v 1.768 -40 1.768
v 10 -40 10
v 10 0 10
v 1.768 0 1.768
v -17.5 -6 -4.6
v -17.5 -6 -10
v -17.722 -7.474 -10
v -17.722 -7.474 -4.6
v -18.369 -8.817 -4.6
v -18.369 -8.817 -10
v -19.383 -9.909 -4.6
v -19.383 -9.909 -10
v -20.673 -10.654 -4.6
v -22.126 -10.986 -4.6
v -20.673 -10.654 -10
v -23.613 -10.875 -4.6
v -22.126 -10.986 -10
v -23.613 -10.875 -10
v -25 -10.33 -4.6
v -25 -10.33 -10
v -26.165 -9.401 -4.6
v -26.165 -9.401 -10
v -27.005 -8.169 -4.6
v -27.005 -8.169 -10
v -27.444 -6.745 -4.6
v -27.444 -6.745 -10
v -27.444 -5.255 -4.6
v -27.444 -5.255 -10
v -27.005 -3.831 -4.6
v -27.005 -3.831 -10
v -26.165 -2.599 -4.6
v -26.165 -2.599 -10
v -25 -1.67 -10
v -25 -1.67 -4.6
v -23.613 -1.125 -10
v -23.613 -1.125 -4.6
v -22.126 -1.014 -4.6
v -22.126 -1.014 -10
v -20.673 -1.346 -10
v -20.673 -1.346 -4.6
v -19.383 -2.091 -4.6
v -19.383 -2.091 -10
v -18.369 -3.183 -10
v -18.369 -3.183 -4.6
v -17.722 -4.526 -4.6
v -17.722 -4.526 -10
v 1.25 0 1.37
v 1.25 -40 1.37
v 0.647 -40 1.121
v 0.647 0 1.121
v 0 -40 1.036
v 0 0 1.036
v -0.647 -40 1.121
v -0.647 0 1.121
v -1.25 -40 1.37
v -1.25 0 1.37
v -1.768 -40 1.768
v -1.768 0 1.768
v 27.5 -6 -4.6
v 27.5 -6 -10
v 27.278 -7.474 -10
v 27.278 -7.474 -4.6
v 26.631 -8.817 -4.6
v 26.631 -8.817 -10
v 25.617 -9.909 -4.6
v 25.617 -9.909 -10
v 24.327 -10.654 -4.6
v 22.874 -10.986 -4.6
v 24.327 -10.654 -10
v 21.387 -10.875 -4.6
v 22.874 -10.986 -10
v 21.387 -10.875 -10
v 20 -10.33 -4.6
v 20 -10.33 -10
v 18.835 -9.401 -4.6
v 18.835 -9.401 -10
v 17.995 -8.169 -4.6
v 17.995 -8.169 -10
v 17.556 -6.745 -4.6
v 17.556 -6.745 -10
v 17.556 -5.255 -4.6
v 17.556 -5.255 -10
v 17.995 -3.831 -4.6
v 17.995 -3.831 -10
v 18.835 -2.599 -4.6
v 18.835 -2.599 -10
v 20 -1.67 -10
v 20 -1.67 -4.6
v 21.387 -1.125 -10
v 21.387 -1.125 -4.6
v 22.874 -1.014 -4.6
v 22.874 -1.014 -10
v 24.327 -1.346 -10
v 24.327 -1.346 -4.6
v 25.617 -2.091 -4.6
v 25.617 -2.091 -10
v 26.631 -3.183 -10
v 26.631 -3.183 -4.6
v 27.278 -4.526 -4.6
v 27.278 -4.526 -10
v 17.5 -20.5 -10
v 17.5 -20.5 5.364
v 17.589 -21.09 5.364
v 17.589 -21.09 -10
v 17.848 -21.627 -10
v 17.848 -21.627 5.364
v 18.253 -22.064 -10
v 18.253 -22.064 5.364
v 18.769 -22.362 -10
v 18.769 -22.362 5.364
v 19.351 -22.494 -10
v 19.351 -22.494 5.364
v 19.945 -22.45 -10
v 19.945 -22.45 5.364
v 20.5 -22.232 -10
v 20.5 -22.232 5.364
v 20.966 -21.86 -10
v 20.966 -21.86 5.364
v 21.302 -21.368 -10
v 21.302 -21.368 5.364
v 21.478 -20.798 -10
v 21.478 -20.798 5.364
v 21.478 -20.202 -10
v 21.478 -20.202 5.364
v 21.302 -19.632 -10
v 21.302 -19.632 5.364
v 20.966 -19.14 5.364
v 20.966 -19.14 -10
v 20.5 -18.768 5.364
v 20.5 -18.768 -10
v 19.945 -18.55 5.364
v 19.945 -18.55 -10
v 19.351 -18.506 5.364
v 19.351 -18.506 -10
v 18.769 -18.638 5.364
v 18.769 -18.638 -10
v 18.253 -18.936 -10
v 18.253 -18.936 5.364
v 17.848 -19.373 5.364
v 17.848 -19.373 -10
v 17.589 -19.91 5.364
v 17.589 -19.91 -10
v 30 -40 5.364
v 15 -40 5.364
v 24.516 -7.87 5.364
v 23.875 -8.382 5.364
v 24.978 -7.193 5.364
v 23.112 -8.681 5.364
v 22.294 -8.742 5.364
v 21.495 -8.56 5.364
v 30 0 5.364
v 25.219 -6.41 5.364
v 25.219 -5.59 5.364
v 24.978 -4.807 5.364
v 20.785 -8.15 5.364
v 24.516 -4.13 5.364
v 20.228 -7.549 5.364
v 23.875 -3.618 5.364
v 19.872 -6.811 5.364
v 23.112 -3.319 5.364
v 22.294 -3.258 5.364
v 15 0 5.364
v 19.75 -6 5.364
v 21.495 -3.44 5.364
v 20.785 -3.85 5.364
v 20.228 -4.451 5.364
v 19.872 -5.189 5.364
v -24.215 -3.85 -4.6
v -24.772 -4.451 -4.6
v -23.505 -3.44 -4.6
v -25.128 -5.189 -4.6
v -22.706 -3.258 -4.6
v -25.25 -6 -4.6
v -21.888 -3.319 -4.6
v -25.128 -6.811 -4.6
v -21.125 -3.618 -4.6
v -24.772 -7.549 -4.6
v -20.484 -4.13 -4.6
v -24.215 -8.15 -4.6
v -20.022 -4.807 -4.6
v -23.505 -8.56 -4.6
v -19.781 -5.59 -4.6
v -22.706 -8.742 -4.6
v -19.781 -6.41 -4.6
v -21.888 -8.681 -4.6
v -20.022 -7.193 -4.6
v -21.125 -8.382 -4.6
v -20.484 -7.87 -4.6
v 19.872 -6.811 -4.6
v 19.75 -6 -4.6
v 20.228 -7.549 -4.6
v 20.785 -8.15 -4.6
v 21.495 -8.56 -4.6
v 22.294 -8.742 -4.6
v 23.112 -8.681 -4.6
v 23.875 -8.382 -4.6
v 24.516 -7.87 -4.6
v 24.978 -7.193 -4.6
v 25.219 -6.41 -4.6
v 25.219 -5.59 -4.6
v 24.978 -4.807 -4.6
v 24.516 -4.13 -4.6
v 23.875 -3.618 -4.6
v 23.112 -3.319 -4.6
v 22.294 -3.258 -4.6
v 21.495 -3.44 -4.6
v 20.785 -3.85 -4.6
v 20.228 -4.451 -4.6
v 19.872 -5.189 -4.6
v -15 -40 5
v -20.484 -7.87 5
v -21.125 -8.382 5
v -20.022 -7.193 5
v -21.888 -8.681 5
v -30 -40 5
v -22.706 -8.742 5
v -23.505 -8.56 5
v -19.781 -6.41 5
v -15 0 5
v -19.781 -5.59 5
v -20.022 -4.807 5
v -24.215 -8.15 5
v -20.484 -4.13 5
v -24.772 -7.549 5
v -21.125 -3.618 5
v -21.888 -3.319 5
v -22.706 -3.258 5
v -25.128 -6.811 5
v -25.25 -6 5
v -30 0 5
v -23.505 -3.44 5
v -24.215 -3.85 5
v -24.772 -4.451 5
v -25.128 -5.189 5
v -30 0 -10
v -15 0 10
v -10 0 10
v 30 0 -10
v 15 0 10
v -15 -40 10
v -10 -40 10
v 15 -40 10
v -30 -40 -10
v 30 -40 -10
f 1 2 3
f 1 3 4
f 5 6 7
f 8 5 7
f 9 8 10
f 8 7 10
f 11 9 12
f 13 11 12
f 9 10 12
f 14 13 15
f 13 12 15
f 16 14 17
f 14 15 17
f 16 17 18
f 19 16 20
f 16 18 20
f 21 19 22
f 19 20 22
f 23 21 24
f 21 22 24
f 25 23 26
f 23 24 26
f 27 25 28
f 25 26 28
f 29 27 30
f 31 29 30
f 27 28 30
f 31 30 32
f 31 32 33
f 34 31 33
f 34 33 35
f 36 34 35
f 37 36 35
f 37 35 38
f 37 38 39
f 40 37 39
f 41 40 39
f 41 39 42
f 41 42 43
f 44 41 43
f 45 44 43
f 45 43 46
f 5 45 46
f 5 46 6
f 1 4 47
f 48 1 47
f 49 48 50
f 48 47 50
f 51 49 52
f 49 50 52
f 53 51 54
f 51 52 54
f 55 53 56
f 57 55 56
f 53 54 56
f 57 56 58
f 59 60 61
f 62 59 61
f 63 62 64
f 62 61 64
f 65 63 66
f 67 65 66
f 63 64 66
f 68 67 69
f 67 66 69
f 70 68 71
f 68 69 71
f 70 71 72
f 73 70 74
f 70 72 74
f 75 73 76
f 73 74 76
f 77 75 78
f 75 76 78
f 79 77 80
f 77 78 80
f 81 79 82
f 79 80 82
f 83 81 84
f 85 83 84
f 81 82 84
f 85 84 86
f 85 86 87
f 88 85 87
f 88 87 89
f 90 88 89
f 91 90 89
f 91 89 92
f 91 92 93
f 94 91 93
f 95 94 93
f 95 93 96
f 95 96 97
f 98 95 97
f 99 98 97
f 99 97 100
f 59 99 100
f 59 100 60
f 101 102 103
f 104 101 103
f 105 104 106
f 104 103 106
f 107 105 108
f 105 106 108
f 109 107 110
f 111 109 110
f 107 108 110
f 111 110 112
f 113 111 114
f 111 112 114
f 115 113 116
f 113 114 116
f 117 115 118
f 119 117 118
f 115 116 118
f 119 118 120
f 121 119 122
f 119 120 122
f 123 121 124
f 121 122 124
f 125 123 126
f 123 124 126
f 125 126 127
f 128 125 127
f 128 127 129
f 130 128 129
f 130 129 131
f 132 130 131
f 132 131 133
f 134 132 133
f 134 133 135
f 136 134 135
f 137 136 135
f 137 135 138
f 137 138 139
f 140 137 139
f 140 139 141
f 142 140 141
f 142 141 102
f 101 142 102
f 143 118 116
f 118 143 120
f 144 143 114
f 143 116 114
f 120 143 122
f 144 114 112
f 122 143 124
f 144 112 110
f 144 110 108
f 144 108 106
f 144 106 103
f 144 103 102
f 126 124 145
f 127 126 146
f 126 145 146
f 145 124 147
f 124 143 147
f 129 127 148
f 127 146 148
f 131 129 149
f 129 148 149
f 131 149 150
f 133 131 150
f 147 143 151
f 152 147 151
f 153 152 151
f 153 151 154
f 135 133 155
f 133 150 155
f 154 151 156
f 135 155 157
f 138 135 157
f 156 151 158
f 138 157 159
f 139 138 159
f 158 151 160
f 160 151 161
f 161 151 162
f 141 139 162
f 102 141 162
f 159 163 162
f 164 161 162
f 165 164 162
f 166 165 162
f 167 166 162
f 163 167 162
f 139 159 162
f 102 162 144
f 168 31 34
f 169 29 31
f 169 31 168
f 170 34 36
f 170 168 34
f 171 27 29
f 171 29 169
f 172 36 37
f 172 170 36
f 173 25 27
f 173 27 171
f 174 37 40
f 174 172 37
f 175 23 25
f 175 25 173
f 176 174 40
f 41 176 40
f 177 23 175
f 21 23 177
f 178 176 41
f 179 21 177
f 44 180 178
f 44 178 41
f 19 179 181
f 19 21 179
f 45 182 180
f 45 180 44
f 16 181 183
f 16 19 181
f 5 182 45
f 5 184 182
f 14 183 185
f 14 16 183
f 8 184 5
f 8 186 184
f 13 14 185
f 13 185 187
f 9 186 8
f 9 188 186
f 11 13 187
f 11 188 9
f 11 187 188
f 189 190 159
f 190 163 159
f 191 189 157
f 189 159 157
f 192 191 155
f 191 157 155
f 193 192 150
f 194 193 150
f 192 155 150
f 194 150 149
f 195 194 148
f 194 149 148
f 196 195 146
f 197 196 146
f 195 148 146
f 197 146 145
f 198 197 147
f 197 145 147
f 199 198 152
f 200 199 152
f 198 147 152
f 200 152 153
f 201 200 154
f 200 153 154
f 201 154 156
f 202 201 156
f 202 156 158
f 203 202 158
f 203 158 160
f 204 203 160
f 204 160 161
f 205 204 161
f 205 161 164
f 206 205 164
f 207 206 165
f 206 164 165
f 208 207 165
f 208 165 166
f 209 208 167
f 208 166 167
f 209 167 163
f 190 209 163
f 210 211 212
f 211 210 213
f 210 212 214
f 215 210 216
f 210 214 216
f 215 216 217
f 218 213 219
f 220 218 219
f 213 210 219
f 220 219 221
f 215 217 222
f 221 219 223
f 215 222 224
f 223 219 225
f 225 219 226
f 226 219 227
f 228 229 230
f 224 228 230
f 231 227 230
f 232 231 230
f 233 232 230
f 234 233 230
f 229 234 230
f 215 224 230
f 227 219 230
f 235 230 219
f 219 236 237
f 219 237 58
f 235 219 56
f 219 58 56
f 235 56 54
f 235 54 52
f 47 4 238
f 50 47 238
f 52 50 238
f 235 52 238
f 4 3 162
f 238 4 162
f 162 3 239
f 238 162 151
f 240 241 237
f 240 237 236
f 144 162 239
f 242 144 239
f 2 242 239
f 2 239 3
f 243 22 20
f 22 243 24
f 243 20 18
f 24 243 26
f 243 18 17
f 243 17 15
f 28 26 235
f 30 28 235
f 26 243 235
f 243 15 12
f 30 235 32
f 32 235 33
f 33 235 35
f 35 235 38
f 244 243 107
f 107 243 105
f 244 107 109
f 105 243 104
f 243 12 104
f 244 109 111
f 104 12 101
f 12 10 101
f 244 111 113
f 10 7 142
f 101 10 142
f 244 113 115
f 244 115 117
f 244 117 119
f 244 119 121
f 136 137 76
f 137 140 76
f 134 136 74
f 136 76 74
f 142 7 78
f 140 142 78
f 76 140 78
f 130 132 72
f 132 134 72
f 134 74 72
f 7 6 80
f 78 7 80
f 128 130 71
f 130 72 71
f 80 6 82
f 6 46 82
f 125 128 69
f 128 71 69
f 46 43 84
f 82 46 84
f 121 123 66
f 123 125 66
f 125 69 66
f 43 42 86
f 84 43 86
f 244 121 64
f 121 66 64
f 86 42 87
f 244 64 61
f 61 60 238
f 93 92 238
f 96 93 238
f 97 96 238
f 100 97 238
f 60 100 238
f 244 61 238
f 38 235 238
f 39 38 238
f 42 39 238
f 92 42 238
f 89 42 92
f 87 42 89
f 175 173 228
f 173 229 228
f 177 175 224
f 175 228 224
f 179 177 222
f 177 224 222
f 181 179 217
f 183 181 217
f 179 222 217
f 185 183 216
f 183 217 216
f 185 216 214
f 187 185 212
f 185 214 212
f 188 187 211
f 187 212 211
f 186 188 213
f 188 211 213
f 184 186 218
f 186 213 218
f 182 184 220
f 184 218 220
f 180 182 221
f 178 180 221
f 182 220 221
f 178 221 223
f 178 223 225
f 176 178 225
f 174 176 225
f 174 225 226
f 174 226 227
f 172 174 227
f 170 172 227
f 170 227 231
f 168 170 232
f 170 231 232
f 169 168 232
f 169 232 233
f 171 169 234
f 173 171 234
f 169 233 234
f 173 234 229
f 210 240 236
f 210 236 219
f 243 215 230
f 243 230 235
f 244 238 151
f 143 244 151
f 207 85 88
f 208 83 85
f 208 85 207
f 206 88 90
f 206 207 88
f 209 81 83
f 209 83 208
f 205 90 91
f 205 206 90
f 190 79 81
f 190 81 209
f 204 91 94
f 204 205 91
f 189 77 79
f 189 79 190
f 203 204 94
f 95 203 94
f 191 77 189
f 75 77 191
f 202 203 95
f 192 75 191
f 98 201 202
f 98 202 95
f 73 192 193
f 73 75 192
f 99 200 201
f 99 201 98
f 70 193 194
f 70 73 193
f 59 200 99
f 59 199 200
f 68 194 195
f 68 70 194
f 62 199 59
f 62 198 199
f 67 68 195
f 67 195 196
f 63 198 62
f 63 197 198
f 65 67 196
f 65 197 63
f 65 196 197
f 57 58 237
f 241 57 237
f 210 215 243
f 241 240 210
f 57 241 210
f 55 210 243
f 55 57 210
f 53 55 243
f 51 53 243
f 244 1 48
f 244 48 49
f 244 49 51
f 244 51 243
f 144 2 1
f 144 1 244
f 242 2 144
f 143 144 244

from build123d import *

# Parameters (mm, degrees)
F1_DEPTH       = 40
F3_D           = 5.5
F3_CBORE_D     = 10
F3_CBORE_DEPTH = 5.4
F5_D           = 4


with BuildPart() as f1:
    # F0 (on Front) → F1 (new body)
    with BuildSketch(Plane.XZ):
        with BuildLine():
            Line((-15, 5), (-30, 5))
            Line((-30, 5), (-30, -10))
            Line((-30, -10), (30, -10))
            Line((30, -10), (30, 5.364162))
            Line((30, 5.364162), (15, 5.364162))
            Line((15, 5.364162), (15, 10))
            Line((15, 10), (10, 10))
            Line((10, 10), (1.767767, 1.767767))
            ThreePointArc((1.767767, 1.767767), (0, 1.035534), (-1.767767, 1.767767))
            Line((-1.767767, 1.767767), (-10, 10))
            Line((-10, 10), (-15, 10))
            Line((-15, 10), (-15, 5))
        make_face()
    extrude(amount=F1_DEPTH)

    # F3 (through all)
    with Locations(Plane(origin=(0, 0, -10), x_dir=(1, 0, 0), z_dir=(0, 0, -1))):
        with Locations((-22.5, 6), (22.5, 6)):
            CounterBoreHole(F3_D / 2, F3_CBORE_D / 2, F3_CBORE_DEPTH)

    # F5 (through all)
    with Locations(Plane(origin=(0, 0, -10), x_dir=(1, 0, 0), z_dir=(0, 0, -1))):
        with Locations((19.5, 20.5)):
            Hole(F5_D / 2)


solid = f1.part
